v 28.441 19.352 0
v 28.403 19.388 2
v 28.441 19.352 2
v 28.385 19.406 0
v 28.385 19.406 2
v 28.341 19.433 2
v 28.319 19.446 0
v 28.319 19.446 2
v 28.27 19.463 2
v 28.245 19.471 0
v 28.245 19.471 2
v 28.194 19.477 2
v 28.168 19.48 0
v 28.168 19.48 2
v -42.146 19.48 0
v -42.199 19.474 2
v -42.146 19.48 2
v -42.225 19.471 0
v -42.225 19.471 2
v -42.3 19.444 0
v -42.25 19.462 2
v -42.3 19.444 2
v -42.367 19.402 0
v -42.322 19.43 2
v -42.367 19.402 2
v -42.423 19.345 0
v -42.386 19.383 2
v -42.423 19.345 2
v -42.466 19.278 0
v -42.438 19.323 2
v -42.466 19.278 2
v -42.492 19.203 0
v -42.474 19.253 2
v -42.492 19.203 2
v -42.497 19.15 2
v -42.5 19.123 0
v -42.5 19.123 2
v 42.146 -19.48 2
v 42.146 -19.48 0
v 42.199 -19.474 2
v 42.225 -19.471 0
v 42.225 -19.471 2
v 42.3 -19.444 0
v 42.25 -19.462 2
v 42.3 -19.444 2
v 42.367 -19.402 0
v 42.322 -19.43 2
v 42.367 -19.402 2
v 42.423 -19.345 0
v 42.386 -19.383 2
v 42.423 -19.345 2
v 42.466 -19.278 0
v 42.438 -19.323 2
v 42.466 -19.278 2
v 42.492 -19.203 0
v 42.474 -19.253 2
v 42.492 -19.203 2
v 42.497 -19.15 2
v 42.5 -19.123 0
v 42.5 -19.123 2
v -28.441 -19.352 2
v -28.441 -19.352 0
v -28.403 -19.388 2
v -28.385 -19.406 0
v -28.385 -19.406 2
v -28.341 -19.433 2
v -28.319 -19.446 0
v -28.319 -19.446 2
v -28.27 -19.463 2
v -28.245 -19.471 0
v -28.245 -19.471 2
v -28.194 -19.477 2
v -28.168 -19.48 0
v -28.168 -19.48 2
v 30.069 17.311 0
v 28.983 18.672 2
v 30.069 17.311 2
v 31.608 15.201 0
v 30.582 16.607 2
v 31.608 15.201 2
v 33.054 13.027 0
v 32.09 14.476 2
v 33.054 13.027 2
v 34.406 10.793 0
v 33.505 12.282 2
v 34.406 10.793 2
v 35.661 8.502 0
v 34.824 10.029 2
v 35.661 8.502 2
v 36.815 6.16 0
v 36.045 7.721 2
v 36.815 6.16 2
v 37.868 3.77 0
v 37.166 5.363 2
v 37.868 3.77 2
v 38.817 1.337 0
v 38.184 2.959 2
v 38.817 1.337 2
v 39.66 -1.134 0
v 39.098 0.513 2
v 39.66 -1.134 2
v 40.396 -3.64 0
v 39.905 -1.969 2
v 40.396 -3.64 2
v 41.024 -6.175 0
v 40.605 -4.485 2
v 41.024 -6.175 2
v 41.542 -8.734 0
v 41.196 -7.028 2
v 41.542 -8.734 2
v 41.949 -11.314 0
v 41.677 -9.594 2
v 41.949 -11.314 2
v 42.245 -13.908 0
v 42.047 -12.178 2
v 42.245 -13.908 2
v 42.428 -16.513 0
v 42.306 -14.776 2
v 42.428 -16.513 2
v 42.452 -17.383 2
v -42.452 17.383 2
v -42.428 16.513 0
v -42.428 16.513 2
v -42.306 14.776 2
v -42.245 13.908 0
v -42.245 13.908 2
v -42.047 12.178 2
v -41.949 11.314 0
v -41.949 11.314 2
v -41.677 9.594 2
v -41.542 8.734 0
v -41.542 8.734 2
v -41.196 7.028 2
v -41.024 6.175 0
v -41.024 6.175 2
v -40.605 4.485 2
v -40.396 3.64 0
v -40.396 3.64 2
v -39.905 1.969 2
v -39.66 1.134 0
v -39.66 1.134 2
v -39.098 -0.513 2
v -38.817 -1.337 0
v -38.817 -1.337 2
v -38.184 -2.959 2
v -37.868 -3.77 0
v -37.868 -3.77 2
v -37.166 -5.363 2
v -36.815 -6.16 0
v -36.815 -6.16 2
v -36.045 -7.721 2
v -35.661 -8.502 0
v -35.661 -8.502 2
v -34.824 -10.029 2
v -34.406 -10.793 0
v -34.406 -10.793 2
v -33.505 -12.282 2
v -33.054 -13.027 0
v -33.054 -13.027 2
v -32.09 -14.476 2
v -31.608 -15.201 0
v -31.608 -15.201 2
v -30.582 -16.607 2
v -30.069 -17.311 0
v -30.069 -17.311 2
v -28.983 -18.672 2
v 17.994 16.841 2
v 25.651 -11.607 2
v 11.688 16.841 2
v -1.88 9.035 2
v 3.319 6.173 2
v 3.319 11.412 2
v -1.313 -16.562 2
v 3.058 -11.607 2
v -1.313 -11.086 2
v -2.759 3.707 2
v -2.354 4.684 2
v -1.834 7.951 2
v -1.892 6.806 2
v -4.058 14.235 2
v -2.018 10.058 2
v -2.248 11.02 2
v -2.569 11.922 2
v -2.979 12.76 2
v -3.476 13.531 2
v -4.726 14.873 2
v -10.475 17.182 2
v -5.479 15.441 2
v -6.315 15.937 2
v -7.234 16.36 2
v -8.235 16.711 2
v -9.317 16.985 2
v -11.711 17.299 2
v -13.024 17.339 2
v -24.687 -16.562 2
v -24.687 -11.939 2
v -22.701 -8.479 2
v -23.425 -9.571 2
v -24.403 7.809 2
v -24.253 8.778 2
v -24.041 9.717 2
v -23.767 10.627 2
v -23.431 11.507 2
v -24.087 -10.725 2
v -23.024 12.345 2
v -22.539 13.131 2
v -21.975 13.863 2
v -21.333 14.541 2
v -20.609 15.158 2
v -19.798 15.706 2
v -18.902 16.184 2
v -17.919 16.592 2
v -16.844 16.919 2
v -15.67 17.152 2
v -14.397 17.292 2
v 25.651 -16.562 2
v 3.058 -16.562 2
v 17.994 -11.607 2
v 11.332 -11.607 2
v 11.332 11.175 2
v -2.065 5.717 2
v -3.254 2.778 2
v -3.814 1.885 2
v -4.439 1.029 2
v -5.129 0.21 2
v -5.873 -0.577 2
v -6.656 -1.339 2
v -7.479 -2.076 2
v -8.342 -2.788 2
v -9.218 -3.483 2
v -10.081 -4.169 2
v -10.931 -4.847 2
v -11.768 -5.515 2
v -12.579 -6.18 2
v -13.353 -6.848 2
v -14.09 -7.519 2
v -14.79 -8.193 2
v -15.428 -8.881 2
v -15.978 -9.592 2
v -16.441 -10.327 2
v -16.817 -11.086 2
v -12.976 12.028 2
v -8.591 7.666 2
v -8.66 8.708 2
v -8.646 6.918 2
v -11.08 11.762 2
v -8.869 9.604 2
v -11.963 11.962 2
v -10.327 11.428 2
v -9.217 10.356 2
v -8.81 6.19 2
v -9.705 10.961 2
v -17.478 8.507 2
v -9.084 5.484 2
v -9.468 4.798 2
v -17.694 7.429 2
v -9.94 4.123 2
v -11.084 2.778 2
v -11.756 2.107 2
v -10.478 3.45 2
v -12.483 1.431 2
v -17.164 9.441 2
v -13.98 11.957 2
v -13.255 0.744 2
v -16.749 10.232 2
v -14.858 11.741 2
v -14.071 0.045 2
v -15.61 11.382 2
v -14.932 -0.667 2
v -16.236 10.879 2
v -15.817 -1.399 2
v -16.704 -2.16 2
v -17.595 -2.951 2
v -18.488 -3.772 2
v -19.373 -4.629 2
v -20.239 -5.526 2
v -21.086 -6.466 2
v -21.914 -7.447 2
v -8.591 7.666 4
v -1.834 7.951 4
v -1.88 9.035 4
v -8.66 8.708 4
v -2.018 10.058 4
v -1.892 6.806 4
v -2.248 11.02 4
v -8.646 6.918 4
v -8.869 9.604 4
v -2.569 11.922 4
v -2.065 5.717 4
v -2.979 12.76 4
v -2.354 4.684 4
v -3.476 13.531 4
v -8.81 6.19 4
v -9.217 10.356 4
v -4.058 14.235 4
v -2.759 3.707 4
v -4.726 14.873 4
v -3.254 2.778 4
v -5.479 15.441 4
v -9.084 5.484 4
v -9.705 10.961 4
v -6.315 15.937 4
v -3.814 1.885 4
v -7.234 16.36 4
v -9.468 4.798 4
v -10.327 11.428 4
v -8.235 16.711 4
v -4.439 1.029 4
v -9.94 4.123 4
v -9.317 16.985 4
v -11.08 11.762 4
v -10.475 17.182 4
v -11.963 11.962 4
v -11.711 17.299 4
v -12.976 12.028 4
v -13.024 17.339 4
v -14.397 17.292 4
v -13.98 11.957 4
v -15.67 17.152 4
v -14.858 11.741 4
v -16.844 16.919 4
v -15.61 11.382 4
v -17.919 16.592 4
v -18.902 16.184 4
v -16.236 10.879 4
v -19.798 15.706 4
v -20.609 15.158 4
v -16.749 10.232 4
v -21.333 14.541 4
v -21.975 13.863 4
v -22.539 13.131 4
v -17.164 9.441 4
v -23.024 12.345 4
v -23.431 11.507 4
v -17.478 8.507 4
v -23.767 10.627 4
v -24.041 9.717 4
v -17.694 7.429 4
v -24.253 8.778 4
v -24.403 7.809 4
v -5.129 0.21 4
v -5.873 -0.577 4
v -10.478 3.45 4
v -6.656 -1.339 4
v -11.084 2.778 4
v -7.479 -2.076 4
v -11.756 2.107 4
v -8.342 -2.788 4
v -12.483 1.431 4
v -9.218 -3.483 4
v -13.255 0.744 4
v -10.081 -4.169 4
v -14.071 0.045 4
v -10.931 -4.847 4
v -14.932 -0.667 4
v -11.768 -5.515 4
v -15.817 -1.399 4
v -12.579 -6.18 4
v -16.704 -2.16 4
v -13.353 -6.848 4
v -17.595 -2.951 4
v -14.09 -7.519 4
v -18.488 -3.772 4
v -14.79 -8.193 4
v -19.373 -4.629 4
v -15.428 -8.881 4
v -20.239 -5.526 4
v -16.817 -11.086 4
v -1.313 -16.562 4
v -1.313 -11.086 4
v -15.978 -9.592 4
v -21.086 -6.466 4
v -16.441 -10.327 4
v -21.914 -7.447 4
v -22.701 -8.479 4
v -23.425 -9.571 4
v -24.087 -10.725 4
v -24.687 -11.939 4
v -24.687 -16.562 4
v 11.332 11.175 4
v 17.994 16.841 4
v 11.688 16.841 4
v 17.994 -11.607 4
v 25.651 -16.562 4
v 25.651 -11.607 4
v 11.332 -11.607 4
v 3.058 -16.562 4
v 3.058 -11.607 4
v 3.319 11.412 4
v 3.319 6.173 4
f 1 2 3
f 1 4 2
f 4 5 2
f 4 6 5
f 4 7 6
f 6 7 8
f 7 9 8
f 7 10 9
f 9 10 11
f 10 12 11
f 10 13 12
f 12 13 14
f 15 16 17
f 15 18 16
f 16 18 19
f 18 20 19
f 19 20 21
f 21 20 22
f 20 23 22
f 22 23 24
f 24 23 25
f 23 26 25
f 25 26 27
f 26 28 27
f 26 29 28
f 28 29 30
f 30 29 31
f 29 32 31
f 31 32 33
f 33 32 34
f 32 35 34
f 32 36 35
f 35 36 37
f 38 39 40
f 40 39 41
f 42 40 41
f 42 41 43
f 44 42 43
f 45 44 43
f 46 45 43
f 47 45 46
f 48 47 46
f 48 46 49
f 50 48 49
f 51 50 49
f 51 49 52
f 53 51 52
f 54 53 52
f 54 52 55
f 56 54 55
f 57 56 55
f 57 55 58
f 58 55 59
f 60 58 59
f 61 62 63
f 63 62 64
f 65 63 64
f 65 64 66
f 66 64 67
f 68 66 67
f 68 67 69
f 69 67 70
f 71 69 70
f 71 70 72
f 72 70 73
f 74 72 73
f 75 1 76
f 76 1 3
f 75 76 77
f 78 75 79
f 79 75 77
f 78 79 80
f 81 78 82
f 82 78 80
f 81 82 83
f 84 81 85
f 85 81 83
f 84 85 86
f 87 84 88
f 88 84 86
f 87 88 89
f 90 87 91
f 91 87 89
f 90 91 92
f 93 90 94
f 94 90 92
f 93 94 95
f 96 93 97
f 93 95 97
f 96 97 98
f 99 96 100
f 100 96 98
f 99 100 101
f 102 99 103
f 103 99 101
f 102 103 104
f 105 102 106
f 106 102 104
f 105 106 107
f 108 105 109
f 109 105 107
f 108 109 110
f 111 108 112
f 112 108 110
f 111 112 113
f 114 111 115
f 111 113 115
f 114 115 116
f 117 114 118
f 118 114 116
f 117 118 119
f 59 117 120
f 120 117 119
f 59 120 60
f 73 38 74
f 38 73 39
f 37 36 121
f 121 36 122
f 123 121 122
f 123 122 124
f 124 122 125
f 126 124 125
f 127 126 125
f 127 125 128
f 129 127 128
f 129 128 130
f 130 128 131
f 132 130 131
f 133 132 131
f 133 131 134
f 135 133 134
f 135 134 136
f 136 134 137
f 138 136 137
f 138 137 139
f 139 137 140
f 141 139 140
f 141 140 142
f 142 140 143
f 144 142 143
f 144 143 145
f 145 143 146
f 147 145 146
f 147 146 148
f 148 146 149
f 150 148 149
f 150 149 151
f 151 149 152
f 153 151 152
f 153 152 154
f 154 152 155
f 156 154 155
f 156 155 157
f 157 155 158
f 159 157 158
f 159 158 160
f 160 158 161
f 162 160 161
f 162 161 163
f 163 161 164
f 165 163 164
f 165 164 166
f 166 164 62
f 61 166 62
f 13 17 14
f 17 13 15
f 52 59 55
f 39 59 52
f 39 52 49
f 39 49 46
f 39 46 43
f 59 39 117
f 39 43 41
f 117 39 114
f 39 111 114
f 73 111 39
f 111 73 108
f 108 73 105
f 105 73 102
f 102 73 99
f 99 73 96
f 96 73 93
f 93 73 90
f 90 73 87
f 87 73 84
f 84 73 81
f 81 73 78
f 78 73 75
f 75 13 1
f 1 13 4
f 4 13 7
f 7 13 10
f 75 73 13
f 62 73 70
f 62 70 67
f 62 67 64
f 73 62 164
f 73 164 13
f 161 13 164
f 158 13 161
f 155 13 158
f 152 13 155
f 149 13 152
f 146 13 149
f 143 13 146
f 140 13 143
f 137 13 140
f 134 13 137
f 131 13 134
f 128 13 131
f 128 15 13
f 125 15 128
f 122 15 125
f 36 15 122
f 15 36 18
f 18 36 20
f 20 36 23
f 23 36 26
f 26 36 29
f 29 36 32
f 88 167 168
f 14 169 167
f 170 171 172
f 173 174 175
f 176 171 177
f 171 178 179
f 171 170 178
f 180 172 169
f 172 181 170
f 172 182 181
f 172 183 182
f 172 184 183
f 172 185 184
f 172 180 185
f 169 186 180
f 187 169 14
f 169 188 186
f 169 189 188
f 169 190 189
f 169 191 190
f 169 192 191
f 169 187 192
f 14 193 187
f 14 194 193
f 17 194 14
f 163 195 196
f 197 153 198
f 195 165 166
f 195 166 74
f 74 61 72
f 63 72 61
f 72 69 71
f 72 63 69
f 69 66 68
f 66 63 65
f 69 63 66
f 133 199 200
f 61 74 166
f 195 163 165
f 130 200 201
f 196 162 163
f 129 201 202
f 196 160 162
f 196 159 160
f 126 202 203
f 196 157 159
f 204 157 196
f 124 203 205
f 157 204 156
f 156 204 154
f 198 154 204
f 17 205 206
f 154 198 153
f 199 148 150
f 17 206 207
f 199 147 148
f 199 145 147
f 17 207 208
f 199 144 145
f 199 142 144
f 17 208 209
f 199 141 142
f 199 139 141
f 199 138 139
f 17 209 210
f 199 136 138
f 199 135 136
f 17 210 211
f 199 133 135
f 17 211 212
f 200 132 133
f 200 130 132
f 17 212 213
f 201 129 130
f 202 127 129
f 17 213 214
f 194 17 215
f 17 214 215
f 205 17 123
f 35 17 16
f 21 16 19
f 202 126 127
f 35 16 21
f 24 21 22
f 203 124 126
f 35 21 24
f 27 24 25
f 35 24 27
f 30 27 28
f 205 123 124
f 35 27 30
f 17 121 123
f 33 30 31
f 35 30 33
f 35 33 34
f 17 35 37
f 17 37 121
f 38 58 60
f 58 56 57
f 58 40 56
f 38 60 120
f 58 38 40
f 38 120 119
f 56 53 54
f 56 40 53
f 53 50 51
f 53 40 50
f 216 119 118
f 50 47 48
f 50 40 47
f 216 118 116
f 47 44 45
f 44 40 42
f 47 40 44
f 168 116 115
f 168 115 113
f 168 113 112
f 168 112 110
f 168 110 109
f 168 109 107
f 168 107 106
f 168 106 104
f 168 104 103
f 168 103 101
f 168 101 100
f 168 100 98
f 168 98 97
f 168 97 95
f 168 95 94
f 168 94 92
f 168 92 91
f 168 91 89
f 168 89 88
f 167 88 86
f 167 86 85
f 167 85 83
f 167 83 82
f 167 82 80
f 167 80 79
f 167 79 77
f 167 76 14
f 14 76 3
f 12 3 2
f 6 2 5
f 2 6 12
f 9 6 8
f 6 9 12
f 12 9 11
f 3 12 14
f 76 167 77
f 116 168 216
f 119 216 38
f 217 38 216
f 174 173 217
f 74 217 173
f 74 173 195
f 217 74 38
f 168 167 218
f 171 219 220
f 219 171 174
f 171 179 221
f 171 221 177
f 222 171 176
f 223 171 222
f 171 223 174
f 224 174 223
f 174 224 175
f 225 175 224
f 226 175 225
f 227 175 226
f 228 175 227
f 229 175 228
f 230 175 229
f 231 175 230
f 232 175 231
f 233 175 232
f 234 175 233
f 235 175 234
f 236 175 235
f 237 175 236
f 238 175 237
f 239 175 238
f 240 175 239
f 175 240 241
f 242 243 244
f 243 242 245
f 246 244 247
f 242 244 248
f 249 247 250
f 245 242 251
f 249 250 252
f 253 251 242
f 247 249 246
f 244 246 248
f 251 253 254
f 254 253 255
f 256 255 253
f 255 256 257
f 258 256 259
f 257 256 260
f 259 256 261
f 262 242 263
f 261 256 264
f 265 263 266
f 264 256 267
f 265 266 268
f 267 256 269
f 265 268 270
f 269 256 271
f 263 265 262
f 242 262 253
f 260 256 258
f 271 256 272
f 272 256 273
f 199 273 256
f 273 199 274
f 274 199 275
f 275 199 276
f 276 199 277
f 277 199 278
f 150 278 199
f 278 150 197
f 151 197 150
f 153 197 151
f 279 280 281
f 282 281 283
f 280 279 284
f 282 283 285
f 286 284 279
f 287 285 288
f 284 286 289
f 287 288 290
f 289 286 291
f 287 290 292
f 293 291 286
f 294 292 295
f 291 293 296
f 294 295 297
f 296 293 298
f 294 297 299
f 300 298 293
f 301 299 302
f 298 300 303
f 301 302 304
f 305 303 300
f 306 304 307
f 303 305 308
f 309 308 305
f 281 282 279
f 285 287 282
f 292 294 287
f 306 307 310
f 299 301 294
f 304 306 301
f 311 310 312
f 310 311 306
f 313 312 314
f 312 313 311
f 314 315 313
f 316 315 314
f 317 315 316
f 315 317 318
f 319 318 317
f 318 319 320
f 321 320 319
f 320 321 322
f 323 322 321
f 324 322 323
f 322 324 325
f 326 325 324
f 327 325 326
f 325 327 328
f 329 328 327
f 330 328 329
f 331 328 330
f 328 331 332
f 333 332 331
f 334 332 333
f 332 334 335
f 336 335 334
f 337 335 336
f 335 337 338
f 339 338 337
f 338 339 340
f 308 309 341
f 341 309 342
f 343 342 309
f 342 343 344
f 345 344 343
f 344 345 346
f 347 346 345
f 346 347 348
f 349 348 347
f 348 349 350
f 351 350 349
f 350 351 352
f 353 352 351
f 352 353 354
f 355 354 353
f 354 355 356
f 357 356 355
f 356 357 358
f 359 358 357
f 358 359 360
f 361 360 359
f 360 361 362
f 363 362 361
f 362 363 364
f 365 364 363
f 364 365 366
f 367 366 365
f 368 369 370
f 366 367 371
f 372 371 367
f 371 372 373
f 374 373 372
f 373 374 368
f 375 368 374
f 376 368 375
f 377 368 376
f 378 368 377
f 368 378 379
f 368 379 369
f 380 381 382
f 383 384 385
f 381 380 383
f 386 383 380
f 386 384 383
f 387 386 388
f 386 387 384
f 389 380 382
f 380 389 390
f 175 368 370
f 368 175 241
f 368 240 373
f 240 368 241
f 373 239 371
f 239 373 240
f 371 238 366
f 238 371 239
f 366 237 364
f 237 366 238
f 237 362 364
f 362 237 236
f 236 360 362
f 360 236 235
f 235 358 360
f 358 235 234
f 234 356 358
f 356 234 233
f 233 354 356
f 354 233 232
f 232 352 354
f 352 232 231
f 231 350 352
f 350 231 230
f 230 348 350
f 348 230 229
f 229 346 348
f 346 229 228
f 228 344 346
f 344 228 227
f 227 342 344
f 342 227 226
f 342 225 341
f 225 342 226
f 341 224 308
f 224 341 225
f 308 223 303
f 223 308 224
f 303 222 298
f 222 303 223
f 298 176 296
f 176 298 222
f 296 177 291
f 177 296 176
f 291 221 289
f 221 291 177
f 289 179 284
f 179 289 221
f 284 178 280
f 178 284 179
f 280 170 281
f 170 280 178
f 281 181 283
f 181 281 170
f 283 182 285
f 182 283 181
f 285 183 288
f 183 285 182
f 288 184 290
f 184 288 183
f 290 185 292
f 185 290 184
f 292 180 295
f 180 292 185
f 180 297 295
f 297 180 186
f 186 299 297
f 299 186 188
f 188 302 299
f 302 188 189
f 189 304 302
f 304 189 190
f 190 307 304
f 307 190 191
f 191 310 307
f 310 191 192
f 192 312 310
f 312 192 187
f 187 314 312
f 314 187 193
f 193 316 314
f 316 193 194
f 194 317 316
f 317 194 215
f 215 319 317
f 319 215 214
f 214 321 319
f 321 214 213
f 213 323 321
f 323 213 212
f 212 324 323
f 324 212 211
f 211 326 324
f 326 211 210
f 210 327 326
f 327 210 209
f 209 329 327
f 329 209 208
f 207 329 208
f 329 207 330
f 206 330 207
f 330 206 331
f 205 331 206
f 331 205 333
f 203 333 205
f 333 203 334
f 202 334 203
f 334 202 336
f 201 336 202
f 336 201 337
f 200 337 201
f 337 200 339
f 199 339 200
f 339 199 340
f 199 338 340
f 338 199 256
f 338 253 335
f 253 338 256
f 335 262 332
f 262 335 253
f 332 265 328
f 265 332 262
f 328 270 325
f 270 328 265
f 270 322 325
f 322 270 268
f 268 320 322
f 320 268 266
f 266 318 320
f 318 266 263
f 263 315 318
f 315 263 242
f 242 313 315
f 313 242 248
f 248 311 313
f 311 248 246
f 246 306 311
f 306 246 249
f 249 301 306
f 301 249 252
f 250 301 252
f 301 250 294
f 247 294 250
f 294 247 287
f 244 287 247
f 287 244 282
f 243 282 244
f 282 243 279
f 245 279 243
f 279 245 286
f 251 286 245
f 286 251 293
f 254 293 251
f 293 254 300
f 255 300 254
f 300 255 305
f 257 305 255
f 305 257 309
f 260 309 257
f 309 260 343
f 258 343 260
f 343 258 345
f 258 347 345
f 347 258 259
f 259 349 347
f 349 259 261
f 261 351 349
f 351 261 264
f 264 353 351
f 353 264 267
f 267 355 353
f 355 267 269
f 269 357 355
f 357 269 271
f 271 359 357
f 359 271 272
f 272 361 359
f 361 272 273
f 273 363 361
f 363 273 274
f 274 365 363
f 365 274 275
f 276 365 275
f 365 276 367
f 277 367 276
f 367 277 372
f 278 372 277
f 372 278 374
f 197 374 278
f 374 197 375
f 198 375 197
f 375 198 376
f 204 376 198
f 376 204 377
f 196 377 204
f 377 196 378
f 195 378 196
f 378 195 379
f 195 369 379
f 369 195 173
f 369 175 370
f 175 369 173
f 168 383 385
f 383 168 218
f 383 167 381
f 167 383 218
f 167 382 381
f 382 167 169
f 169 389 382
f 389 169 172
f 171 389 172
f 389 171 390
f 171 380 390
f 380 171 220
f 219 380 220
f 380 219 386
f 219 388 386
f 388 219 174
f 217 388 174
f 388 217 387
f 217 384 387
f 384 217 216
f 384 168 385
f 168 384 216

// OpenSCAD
// Gerado por scripts/stl_to_scad.py
// Pontos: 168  Faces: 332

// Parâmetros ajustáveis
width = 85;        // largura desejada (mm) — parâmetro do usuário
thickness = 2;     // espessura desejada (mm) — parâmetro do usuário
// Mostrar marcador na origem (para depuração visual)
show_origin = true;
origin_marker_size = 2; // mm

// -------- Parâmetros de texto (paramétricos) --------
text = "21";            // texto exibido (mude aqui)
text_thickness = 2;      // espessura do texto (extrusão) em mm
text_height = 0;         // altura do texto em mm; se <=0 será calculada automaticamente
text_font = "Arial";    // fonte usada para o texto
text_color = [0,1,0];    // cor do texto (RGB)
text_bold = true;        // usar negrito se true

// Dados originais gerados (não editar manualmente abaixo)
points = [
    [200.29771423339844, 109.64022827148438, 0.0],
    [200.1927490234375, 109.74130249023438, 2.0],
    [200.29771423339844, 109.64022827148438, 2.0],
    [200.14027404785156, 109.79183959960938, 0.0],
    [200.14027404785156, 109.79182434082031, 2.0],
    [200.015869140625, 109.86767578125, 2.0],
    [199.9536590576172, 109.90560913085938, 0.0],
    [199.9536590576172, 109.90560913085938, 2.0],
    [199.8157501220703, 109.95260620117188, 2.0],
    [199.74679565429688, 109.97610473632812, 0.0],
    [199.74679565429688, 109.97610473632812, 2.0],
    [199.60195922851562, 109.99203491210938, 2.0],
    [199.529541015625, 110.0, 0.0],
    [199.529541015625, 110.0, 2.0],
    [0.9999847412109375, 110.0, 0.0],
    [0.8510894775390625, 109.983154296875, 2.0],
    [0.999969482421875, 110.0, 2.0],
    [0.776641845703125, 109.9747314453125, 0.0],
    [0.776641845703125, 109.9747314453125, 2.0],
    [0.5645904541015625, 109.90023803710938, 0.0],
    [0.705963134765625, 109.94990539550781, 2.0],
    [0.5645904541015625, 109.90023803710938, 2.0],
    [0.3745269775390625, 109.78025817871094, 0.0],
    [0.5012359619140625, 109.86024475097656, 2.0],
    [0.3745269775390625, 109.78025817871094, 2.0],
    [0.216064453125, 109.62086486816406, 0.0],
    [0.3217010498046875, 109.72712707519531, 2.0],
    [0.2160491943359375, 109.62086486816406, 2.0],
    [0.097198486328125, 109.43009948730469, 0.0],
    [0.1764373779296875, 109.55728149414062, 2.0],
    [0.097198486328125, 109.43009948730469, 2.0],
    [0.0239410400390625, 109.21762084960938, 0.0],
    [0.0727691650390625, 109.35926818847656, 2.0],
    [0.0239410400390625, 109.21762084960938, 2.0],
    [0.0079803466796875, 109.06861877441406, 2.0],
    [0.0, 108.99412536621094, 0.0],
    [0.0, 108.99412536621094, 2.0],
    [238.99411010742188, 0.0, 0.0],
    [239.1429901123047, 0.016845703125, 2.0],
    [238.99411010742188, 0.0, 2.0],
    [239.21743774414062, 0.0252532958984375, 0.0],
    [239.21743774414062, 0.02526092529296875, 2.0],
    [239.42950439453125, 0.099761962890625, 0.0],
    [239.2881317138672, 0.0500946044921875, 2.0],
    [239.4294891357422, 0.099761962890625, 2.0],
    [239.6195526123047, 0.2197418212890625, 0.0],
    [239.4928436279297, 0.1397552490234375, 2.0],
    [239.6195526123047, 0.2197418212890625, 2.0],
    [239.77801513671875, 0.3791351318359375, 0.0],
    [239.67236328125, 0.2728729248046875, 2.0],
    [239.77801513671875, 0.3791351318359375, 2.0],
    [239.89688110351562, 0.5699005126953125, 0.0],
    [239.81764221191406, 0.442718505859375, 2.0],
    [239.89688110351562, 0.5699005126953125, 2.0],
    [239.9701385498047, 0.7823944091796875, 0.0],
    [239.92129516601562, 0.6407318115234375, 2.0],
    [239.9701385498047, 0.7823944091796875, 2.0],
    [239.98609924316406, 0.9313812255859375, 2.0],
    [239.99407958984375, 1.0058746337890625, 0.0],
    [239.99407958984375, 1.0058746337890625, 2.0],
    [39.69636535644531, 0.35976409912109375, 0.0],
    [39.80133056640625, 0.258697509765625, 2.0],
    [39.69636535644531, 0.359771728515625, 2.0],
    [39.85380554199219, 0.20816802978515625, 0.0],
    [39.85380554199219, 0.2081756591796875, 2.0],
    [39.97821044921875, 0.13232421875, 2.0],
    [40.04042053222656, 0.094390869140625, 0.0],
    [40.04042053222656, 0.09439849853515625, 2.0],
    [40.17832946777344, 0.047393798828125, 2.0],
    [40.247283935546875, 0.0238800048828125, 0.0],
    [40.247283935546875, 0.023895263671875, 2.0],
    [40.392120361328125, 0.007965087890625, 2.0],
    [40.46453857421875, 0.0, 0.0],
    [40.46453857421875, 0.0, 2.0],
    [204.89523315429688, 103.87603759765625, 0.0],
    [201.83021545410156, 107.71882629394531, 2.0],
    [204.89523315429688, 103.87603759765625, 2.0],
    [209.24037170410156, 97.91928100585938, 0.0],
    [206.34361267089844, 101.89044189453125, 2.0],
    [209.24037170410156, 97.91928100585938, 2.0],
    [213.3250732421875, 91.781005859375, 0.0],
    [210.6019287109375, 95.87319946289062, 2.0],
    [213.3250732421875, 91.781005859375, 2.0],
    [217.1417694091797, 85.47259521484375, 0.0],
    [214.5972900390625, 89.67819213867188, 2.0],
    [217.1417694091797, 85.47259521484375, 2.0],
    [220.68338012695312, 79.00575256347656, 0.0],
    [218.3223114013672, 83.31698608398438, 2.0],
    [220.68338012695312, 79.00575256347656, 2.0],
    [223.943359375, 72.3924560546875, 0.0],
    [221.77003479003906, 76.80131530761719, 2.0],
    [223.943359375, 72.3924560546875, 2.0],
    [226.91563415527344, 65.64495849609375, 0.0],
    [224.93411254882812, 70.14328002929688, 2.0],
    [226.91561889648438, 65.64494323730469, 2.0],
    [229.59471130371094, 58.7757568359375, 0.0],
    [227.80865478515625, 63.355224609375, 2.0],
    [229.59471130371094, 58.7757568359375, 2.0],
    [231.97561645507812, 51.79762268066406, 0.0],
    [230.3883514404297, 56.44972229003906, 2.0],
    [231.97561645507812, 51.797630310058594, 2.0],
    [234.053955078125, 44.72346496582031, 0.0],
    [232.66839599609375, 49.43956756591797, 2.0],
    [234.053955078125, 44.723472595214844, 2.0],
    [235.8258514404297, 37.56640625, 0.0],
    [234.64459228515625, 42.33778381347656, 2.0],
    [235.8258514404297, 37.56640625, 2.0],
    [237.28802490234375, 30.339706420898438, 0.0],
    [236.313232421875, 35.157508850097656, 2.0],
    [237.28802490234375, 30.339706420898438, 2.0],
    [238.43777465820312, 23.0567626953125, 0.0],
    [237.67127990722656, 27.912063598632812, 2.0],
    [238.43775939941406, 23.05677032470703, 2.0],
    [239.27297973632812, 15.731086730957031, 0.0],
    [238.71617126464844, 20.6148681640625, 2.0],
    [239.27297973632812, 15.731094360351562, 2.0],
    [239.7920684814453, 8.376243591308594, 0.0],
    [239.4459991455078, 13.279464721679688, 2.0],
    [239.7920684814453, 8.376251220703125, 2.0],
    [239.85940551757812, 5.919464111328125, 2.0],
    [106.64105224609375, 0.0, 2.0],
    [0.1346588134765625, 104.08055114746094, 2.0],
    [0.2020111083984375, 101.62374877929688, 0.0],
    [0.2020111083984375, 101.62376403808594, 2.0],
    [0.548065185546875, 96.72053527832031, 2.0],
    [0.721099853515625, 94.2689208984375, 0.0],
    [0.721099853515625, 94.26890563964844, 2.0],
    [1.2779083251953125, 89.38511657714844, 2.0],
    [1.556304931640625, 86.9432373046875, 0.0],
    [1.556304931640625, 86.9432373046875, 2.0],
    [2.3227996826171875, 82.08793640136719, 2.0],
    [2.7060546875, 79.66029357910156, 0.0],
    [2.7060394287109375, 79.66029357910156, 2.0],
    [3.6808319091796875, 74.84248352050781, 2.0],
    [4.168243408203125, 72.43359375, 0.0],
    [4.168243408203125, 72.43359375, 2.0],
    [5.3495025634765625, 67.66221618652344, 2.0],
    [5.9401397705078125, 65.27651977539062, 0.0],
    [5.9401397705078125, 65.27653503417969, 2.0],
    [7.32568359375, 60.5604248046875, 2.0],
    [8.018463134765625, 58.20237731933594, 0.0],
    [8.018463134765625, 58.20237731933594, 2.0],
    [9.605743408203125, 53.55027770996094, 2.0],
    [10.399383544921875, 51.22423553466797, 0.0],
    [10.399383544921875, 51.2242431640625, 2.0],
    [12.1854248046875, 46.64478302001953, 2.0],
    [13.078460693359375, 44.35504913330078, 0.0],
    [13.078460693359375, 44.35504913330078, 2.0],
    [15.059982299804688, 39.856719970703125, 2.0],
    [16.050735473632812, 37.60755157470703, 0.0],
    [16.050735473632812, 37.60755157470703, 2.0],
    [18.224044799804688, 33.19868469238281, 2.0],
    [19.310699462890625, 30.994247436523438, 0.0],
    [19.310699462890625, 30.994247436523438, 2.0],
    [21.671768188476562, 26.683013916015625, 2.0],
    [22.852310180664062, 24.52739715576172, 0.0],
    [22.852310180664062, 24.52739715576172, 2.0],
    [25.396774291992188, 20.321792602539062, 2.0],
    [26.66900634765625, 18.218994140625, 0.0],
    [26.66900634765625, 18.218994140625, 2.0],
    [29.392135620117188, 14.126808166503906, 2.0],
    [30.753707885742188, 12.080718994140625, 0.0],
    [30.753707885742188, 12.080718994140625, 2.0],
    [33.65046691894531, 8.109550476074219, 2.0],
    [35.098846435546875, 6.12396240234375, 0.0],
    [35.098846435546875, 6.12396240234375, 2.0],
    [38.163848876953125, 2.281158447265625, 2.0],
    [133.35302734375, 110.0, 2.0],
  ];
faces = [
    [0, 1, 2],
    [0, 3, 1],
    [3, 4, 1],
    [3, 5, 4],
    [3, 6, 5],
    [6, 7, 5],
    [6, 8, 7],
    [6, 9, 8],
    [9, 10, 8],
    [9, 11, 10],
    [9, 12, 11],
    [12, 13, 11],
    [14, 15, 16],
    [14, 17, 15],
    [17, 18, 15],
    [17, 19, 18],
    [19, 20, 18],
    [19, 21, 20],
    [19, 22, 21],
    [22, 23, 21],
    [22, 24, 23],
    [22, 25, 24],
    [25, 26, 24],
    [25, 27, 26],
    [25, 28, 27],
    [28, 29, 27],
    [28, 30, 29],
    [28, 31, 30],
    [31, 32, 30],
    [31, 33, 32],
    [31, 34, 33],
    [31, 35, 34],
    [35, 36, 34],
    [37, 38, 39],
    [37, 40, 38],
    [40, 41, 38],
    [40, 42, 41],
    [42, 43, 41],
    [42, 44, 43],
    [42, 45, 44],
    [45, 46, 44],
    [45, 47, 46],
    [45, 48, 47],
    [48, 49, 47],
    [48, 50, 49],
    [48, 51, 50],
    [51, 52, 50],
    [51, 53, 52],
    [51, 54, 53],
    [54, 55, 53],
    [54, 56, 55],
    [54, 57, 56],
    [54, 58, 57],
    [58, 59, 57],
    [60, 61, 62],
    [60, 63, 61],
    [63, 64, 61],
    [63, 65, 64],
    [63, 66, 65],
    [66, 67, 65],
    [66, 68, 67],
    [66, 69, 68],
    [69, 70, 68],
    [69, 71, 70],
    [69, 72, 71],
    [72, 73, 71],
    [74, 0, 75],
    [0, 2, 75],
    [74, 75, 76],
    [77, 74, 78],
    [74, 76, 78],
    [77, 78, 79],
    [80, 77, 81],
    [77, 79, 81],
    [80, 81, 82],
    [83, 80, 84],
    [80, 82, 84],
    [83, 84, 85],
    [86, 83, 87],
    [83, 85, 87],
    [86, 87, 88],
    [89, 86, 90],
    [86, 88, 90],
    [89, 90, 91],
    [92, 89, 93],
    [89, 91, 93],
    [92, 93, 94],
    [95, 92, 96],
    [92, 94, 96],
    [95, 96, 97],
    [98, 95, 99],
    [95, 97, 99],
    [98, 99, 100],
    [101, 98, 102],
    [98, 100, 102],
    [101, 102, 103],
    [104, 101, 105],
    [101, 103, 105],
    [104, 105, 106],
    [107, 104, 108],
    [104, 106, 108],
    [107, 108, 109],
    [110, 107, 111],
    [107, 109, 111],
    [110, 111, 112],
    [113, 110, 114],
    [110, 112, 114],
    [113, 114, 115],
    [116, 113, 117],
    [113, 115, 117],
    [116, 117, 118],
    [58, 116, 119],
    [116, 118, 119],
    [58, 119, 59],
    [37, 39, 120],
    [72, 37, 73],
    [37, 120, 73],
    [35, 121, 36],
    [35, 122, 121],
    [122, 123, 121],
    [122, 124, 123],
    [122, 125, 124],
    [125, 126, 124],
    [125, 127, 126],
    [125, 128, 127],
    [128, 129, 127],
    [128, 130, 129],
    [128, 131, 130],
    [131, 132, 130],
    [131, 133, 132],
    [131, 134, 133],
    [134, 135, 133],
    [134, 136, 135],
    [134, 137, 136],
    [137, 138, 136],
    [137, 139, 138],
    [137, 140, 139],
    [140, 141, 139],
    [140, 142, 141],
    [140, 143, 142],
    [143, 144, 142],
    [143, 145, 144],
    [143, 146, 145],
    [146, 147, 145],
    [146, 148, 147],
    [146, 149, 148],
    [149, 150, 148],
    [149, 151, 150],
    [149, 152, 151],
    [152, 153, 151],
    [152, 154, 153],
    [152, 155, 154],
    [155, 156, 154],
    [155, 157, 156],
    [155, 158, 157],
    [158, 159, 157],
    [158, 160, 159],
    [158, 161, 160],
    [161, 162, 160],
    [161, 163, 162],
    [161, 164, 163],
    [164, 165, 163],
    [164, 166, 165],
    [164, 60, 166],
    [60, 62, 166],
    [12, 14, 13],
    [14, 167, 13],
    [14, 16, 167],
    [9, 6, 12],
    [12, 6, 3],
    [12, 3, 0],
    [0, 74, 12],
    [12, 74, 128],
    [12, 128, 125],
    [128, 74, 131],
    [131, 74, 77],
    [131, 77, 80],
    [131, 80, 134],
    [134, 80, 83],
    [134, 83, 137],
    [137, 83, 86],
    [137, 86, 140],
    [140, 86, 89],
    [140, 89, 143],
    [143, 89, 92],
    [143, 92, 146],
    [146, 92, 95],
    [146, 95, 149],
    [149, 95, 98],
    [149, 98, 152],
    [152, 98, 101],
    [152, 101, 155],
    [155, 101, 104],
    [155, 104, 158],
    [158, 104, 107],
    [158, 107, 161],
    [161, 107, 164],
    [164, 107, 110],
    [164, 110, 72],
    [72, 110, 113],
    [72, 113, 116],
    [72, 116, 37],
    [37, 116, 58],
    [37, 58, 54],
    [54, 51, 37],
    [37, 51, 48],
    [37, 48, 45],
    [45, 42, 37],
    [37, 42, 40],
    [69, 66, 72],
    [72, 66, 63],
    [72, 63, 60],
    [60, 164, 72],
    [125, 122, 12],
    [12, 122, 14],
    [14, 122, 35],
    [14, 35, 31],
    [31, 28, 14],
    [14, 28, 25],
    [14, 25, 22],
    [22, 19, 14],
    [14, 19, 17],
    [59, 119, 53],
    [59, 53, 55],
    [59, 55, 56],
    [59, 56, 57],
    [49, 50, 118],
    [50, 52, 118],
    [118, 52, 119],
    [52, 53, 119],
    [43, 44, 117],
    [44, 46, 117],
    [117, 46, 118],
    [46, 47, 118],
    [118, 47, 49],
    [115, 114, 39],
    [115, 39, 38],
    [115, 38, 41],
    [115, 41, 43],
    [115, 43, 117],
    [39, 114, 112],
    [39, 112, 111],
    [39, 111, 109],
    [39, 109, 108],
    [39, 108, 106],
    [39, 106, 105],
    [39, 105, 103],
    [39, 103, 102],
    [39, 102, 100],
    [39, 100, 99],
    [39, 99, 97],
    [39, 97, 96],
    [39, 96, 94],
    [39, 94, 93],
    [39, 93, 91],
    [39, 91, 90],
    [39, 90, 88],
    [39, 88, 87],
    [39, 87, 85],
    [39, 85, 84],
    [39, 84, 82],
    [39, 82, 81],
    [39, 81, 79],
    [39, 79, 78],
    [39, 78, 76],
    [39, 76, 75],
    [39, 75, 2],
    [39, 2, 1],
    [39, 1, 4],
    [39, 4, 5],
    [39, 5, 7],
    [39, 7, 8],
    [39, 8, 10],
    [39, 10, 11],
    [39, 11, 13],
    [39, 13, 167],
    [39, 167, 120],
    [167, 16, 127],
    [167, 127, 129],
    [167, 129, 130],
    [167, 130, 132],
    [167, 132, 133],
    [167, 133, 135],
    [167, 135, 136],
    [167, 136, 138],
    [167, 138, 139],
    [167, 139, 141],
    [167, 141, 142],
    [167, 142, 144],
    [167, 144, 145],
    [167, 145, 147],
    [167, 147, 148],
    [167, 148, 150],
    [167, 150, 151],
    [167, 151, 153],
    [167, 153, 154],
    [167, 154, 156],
    [167, 156, 157],
    [167, 157, 159],
    [167, 159, 160],
    [167, 160, 162],
    [167, 162, 163],
    [167, 163, 165],
    [167, 165, 166],
    [167, 166, 62],
    [167, 62, 61],
    [167, 61, 64],
    [167, 64, 65],
    [167, 65, 67],
    [167, 67, 68],
    [167, 68, 70],
    [167, 70, 71],
    [167, 71, 73],
    [167, 73, 120],
    [16, 15, 127],
    [15, 18, 127],
    [127, 18, 126],
    [18, 20, 126],
    [126, 20, 21],
    [124, 126, 21],
    [124, 21, 23],
    [124, 23, 24],
    [124, 24, 26],
    [124, 26, 27],
    [124, 27, 123],
    [29, 30, 121],
    [29, 121, 123],
    [29, 123, 27],
    [121, 30, 32],
    [121, 32, 33],
    [121, 33, 34],
    [121, 34, 36],
];

xs = [ for (p = points) p[0] ];
ys = [ for (p = points) p[1] ];
zs = [ for (p = points) p[2] ];

min_x = min(xs);
max_x = max(xs);
min_y = min(ys);
max_y = max(ys);
min_z = min(zs);
max_z = max(zs);

orig_w = max_x - min_x;
orig_h = max_y - min_y;
orig_t = max_z - min_z;

scale_xy = orig_w == 0 ? 1 : width / orig_w;
scale_z = orig_t == 0 ? 1 : thickness / orig_t;

center_x = (min_x + max_x)/2;
center_y = (min_y + max_y)/2;

// Modo de ancoragem: "center" coloca o centro XY em 0,0; "min" coloca o canto mínimo em 0,0
anchor = "center"; // opções: "center" | "min"

tx = anchor == "center" ? -center_x : -min_x;
ty = anchor == "center" ? -center_y : -min_y;
tz = -min_z; // sempre posicionar a base em Z=0

// Pré-transforma todos os pontos (escala + translação) para que o polyhedron fique já posicionado
transformed_points = [ for (p = points) [
  (p[0] + tx) * scale_xy,
  (p[1] + ty) * scale_xy,
  (p[2] + tz) * scale_z
] ];

polyhedron(points = transformed_points, faces = faces);

// Comentários de diagnóstico (valores calculados):
/* Valores (calculados automaticamente):
   original bbox X: [%g, %g]  center_x=%g  width=%g
   original bbox Y: [%g, %g]  center_y=%g  height=%g
   original bbox Z: [%g, %g]  thickness=%g
   scale_xy=%g  scale_z=%g
   anchor=%s
*/

// Marcador visual da origem (útil para ver onde 0,0 está)
if (show_origin) {
  color([1,0,0])
    translate([0,0,origin_marker_size/2])
      cube([origin_marker_size, origin_marker_size, origin_marker_size], center=true);
}

// -------- Texto paramétrico centralizado --------
// calcula altura do texto quando o parâmetro `text_height` for <= 0
auto_text_height = text_height <= 0 ? ((orig_h * scale_xy - 4) <= 0 ? max(1, orig_h * scale_xy * 0.5) : (orig_h * scale_xy - 4)) : text_height;

// monta string de fonte com estilo Bold se solicitado
font_arg = text_bold ? str(text_font, ":style=Bold") : text_font;

// Centro da placa nas coordenadas transformadas (onde queremos centralizar o texto)
transformed_center_x = (center_x + tx) * scale_xy;
transformed_center_y = (center_y + ty) * scale_xy;

// Renderiza o texto centralizado em X/Y sobre a face superior da placa
if (text != "") {
  color(text_color)
    translate([transformed_center_x, transformed_center_y, thickness])
      linear_extrude(height = text_thickness, center = false)
        text(text, size = auto_text_height, font = font_arg, halign = "center", valign = "center");
}
